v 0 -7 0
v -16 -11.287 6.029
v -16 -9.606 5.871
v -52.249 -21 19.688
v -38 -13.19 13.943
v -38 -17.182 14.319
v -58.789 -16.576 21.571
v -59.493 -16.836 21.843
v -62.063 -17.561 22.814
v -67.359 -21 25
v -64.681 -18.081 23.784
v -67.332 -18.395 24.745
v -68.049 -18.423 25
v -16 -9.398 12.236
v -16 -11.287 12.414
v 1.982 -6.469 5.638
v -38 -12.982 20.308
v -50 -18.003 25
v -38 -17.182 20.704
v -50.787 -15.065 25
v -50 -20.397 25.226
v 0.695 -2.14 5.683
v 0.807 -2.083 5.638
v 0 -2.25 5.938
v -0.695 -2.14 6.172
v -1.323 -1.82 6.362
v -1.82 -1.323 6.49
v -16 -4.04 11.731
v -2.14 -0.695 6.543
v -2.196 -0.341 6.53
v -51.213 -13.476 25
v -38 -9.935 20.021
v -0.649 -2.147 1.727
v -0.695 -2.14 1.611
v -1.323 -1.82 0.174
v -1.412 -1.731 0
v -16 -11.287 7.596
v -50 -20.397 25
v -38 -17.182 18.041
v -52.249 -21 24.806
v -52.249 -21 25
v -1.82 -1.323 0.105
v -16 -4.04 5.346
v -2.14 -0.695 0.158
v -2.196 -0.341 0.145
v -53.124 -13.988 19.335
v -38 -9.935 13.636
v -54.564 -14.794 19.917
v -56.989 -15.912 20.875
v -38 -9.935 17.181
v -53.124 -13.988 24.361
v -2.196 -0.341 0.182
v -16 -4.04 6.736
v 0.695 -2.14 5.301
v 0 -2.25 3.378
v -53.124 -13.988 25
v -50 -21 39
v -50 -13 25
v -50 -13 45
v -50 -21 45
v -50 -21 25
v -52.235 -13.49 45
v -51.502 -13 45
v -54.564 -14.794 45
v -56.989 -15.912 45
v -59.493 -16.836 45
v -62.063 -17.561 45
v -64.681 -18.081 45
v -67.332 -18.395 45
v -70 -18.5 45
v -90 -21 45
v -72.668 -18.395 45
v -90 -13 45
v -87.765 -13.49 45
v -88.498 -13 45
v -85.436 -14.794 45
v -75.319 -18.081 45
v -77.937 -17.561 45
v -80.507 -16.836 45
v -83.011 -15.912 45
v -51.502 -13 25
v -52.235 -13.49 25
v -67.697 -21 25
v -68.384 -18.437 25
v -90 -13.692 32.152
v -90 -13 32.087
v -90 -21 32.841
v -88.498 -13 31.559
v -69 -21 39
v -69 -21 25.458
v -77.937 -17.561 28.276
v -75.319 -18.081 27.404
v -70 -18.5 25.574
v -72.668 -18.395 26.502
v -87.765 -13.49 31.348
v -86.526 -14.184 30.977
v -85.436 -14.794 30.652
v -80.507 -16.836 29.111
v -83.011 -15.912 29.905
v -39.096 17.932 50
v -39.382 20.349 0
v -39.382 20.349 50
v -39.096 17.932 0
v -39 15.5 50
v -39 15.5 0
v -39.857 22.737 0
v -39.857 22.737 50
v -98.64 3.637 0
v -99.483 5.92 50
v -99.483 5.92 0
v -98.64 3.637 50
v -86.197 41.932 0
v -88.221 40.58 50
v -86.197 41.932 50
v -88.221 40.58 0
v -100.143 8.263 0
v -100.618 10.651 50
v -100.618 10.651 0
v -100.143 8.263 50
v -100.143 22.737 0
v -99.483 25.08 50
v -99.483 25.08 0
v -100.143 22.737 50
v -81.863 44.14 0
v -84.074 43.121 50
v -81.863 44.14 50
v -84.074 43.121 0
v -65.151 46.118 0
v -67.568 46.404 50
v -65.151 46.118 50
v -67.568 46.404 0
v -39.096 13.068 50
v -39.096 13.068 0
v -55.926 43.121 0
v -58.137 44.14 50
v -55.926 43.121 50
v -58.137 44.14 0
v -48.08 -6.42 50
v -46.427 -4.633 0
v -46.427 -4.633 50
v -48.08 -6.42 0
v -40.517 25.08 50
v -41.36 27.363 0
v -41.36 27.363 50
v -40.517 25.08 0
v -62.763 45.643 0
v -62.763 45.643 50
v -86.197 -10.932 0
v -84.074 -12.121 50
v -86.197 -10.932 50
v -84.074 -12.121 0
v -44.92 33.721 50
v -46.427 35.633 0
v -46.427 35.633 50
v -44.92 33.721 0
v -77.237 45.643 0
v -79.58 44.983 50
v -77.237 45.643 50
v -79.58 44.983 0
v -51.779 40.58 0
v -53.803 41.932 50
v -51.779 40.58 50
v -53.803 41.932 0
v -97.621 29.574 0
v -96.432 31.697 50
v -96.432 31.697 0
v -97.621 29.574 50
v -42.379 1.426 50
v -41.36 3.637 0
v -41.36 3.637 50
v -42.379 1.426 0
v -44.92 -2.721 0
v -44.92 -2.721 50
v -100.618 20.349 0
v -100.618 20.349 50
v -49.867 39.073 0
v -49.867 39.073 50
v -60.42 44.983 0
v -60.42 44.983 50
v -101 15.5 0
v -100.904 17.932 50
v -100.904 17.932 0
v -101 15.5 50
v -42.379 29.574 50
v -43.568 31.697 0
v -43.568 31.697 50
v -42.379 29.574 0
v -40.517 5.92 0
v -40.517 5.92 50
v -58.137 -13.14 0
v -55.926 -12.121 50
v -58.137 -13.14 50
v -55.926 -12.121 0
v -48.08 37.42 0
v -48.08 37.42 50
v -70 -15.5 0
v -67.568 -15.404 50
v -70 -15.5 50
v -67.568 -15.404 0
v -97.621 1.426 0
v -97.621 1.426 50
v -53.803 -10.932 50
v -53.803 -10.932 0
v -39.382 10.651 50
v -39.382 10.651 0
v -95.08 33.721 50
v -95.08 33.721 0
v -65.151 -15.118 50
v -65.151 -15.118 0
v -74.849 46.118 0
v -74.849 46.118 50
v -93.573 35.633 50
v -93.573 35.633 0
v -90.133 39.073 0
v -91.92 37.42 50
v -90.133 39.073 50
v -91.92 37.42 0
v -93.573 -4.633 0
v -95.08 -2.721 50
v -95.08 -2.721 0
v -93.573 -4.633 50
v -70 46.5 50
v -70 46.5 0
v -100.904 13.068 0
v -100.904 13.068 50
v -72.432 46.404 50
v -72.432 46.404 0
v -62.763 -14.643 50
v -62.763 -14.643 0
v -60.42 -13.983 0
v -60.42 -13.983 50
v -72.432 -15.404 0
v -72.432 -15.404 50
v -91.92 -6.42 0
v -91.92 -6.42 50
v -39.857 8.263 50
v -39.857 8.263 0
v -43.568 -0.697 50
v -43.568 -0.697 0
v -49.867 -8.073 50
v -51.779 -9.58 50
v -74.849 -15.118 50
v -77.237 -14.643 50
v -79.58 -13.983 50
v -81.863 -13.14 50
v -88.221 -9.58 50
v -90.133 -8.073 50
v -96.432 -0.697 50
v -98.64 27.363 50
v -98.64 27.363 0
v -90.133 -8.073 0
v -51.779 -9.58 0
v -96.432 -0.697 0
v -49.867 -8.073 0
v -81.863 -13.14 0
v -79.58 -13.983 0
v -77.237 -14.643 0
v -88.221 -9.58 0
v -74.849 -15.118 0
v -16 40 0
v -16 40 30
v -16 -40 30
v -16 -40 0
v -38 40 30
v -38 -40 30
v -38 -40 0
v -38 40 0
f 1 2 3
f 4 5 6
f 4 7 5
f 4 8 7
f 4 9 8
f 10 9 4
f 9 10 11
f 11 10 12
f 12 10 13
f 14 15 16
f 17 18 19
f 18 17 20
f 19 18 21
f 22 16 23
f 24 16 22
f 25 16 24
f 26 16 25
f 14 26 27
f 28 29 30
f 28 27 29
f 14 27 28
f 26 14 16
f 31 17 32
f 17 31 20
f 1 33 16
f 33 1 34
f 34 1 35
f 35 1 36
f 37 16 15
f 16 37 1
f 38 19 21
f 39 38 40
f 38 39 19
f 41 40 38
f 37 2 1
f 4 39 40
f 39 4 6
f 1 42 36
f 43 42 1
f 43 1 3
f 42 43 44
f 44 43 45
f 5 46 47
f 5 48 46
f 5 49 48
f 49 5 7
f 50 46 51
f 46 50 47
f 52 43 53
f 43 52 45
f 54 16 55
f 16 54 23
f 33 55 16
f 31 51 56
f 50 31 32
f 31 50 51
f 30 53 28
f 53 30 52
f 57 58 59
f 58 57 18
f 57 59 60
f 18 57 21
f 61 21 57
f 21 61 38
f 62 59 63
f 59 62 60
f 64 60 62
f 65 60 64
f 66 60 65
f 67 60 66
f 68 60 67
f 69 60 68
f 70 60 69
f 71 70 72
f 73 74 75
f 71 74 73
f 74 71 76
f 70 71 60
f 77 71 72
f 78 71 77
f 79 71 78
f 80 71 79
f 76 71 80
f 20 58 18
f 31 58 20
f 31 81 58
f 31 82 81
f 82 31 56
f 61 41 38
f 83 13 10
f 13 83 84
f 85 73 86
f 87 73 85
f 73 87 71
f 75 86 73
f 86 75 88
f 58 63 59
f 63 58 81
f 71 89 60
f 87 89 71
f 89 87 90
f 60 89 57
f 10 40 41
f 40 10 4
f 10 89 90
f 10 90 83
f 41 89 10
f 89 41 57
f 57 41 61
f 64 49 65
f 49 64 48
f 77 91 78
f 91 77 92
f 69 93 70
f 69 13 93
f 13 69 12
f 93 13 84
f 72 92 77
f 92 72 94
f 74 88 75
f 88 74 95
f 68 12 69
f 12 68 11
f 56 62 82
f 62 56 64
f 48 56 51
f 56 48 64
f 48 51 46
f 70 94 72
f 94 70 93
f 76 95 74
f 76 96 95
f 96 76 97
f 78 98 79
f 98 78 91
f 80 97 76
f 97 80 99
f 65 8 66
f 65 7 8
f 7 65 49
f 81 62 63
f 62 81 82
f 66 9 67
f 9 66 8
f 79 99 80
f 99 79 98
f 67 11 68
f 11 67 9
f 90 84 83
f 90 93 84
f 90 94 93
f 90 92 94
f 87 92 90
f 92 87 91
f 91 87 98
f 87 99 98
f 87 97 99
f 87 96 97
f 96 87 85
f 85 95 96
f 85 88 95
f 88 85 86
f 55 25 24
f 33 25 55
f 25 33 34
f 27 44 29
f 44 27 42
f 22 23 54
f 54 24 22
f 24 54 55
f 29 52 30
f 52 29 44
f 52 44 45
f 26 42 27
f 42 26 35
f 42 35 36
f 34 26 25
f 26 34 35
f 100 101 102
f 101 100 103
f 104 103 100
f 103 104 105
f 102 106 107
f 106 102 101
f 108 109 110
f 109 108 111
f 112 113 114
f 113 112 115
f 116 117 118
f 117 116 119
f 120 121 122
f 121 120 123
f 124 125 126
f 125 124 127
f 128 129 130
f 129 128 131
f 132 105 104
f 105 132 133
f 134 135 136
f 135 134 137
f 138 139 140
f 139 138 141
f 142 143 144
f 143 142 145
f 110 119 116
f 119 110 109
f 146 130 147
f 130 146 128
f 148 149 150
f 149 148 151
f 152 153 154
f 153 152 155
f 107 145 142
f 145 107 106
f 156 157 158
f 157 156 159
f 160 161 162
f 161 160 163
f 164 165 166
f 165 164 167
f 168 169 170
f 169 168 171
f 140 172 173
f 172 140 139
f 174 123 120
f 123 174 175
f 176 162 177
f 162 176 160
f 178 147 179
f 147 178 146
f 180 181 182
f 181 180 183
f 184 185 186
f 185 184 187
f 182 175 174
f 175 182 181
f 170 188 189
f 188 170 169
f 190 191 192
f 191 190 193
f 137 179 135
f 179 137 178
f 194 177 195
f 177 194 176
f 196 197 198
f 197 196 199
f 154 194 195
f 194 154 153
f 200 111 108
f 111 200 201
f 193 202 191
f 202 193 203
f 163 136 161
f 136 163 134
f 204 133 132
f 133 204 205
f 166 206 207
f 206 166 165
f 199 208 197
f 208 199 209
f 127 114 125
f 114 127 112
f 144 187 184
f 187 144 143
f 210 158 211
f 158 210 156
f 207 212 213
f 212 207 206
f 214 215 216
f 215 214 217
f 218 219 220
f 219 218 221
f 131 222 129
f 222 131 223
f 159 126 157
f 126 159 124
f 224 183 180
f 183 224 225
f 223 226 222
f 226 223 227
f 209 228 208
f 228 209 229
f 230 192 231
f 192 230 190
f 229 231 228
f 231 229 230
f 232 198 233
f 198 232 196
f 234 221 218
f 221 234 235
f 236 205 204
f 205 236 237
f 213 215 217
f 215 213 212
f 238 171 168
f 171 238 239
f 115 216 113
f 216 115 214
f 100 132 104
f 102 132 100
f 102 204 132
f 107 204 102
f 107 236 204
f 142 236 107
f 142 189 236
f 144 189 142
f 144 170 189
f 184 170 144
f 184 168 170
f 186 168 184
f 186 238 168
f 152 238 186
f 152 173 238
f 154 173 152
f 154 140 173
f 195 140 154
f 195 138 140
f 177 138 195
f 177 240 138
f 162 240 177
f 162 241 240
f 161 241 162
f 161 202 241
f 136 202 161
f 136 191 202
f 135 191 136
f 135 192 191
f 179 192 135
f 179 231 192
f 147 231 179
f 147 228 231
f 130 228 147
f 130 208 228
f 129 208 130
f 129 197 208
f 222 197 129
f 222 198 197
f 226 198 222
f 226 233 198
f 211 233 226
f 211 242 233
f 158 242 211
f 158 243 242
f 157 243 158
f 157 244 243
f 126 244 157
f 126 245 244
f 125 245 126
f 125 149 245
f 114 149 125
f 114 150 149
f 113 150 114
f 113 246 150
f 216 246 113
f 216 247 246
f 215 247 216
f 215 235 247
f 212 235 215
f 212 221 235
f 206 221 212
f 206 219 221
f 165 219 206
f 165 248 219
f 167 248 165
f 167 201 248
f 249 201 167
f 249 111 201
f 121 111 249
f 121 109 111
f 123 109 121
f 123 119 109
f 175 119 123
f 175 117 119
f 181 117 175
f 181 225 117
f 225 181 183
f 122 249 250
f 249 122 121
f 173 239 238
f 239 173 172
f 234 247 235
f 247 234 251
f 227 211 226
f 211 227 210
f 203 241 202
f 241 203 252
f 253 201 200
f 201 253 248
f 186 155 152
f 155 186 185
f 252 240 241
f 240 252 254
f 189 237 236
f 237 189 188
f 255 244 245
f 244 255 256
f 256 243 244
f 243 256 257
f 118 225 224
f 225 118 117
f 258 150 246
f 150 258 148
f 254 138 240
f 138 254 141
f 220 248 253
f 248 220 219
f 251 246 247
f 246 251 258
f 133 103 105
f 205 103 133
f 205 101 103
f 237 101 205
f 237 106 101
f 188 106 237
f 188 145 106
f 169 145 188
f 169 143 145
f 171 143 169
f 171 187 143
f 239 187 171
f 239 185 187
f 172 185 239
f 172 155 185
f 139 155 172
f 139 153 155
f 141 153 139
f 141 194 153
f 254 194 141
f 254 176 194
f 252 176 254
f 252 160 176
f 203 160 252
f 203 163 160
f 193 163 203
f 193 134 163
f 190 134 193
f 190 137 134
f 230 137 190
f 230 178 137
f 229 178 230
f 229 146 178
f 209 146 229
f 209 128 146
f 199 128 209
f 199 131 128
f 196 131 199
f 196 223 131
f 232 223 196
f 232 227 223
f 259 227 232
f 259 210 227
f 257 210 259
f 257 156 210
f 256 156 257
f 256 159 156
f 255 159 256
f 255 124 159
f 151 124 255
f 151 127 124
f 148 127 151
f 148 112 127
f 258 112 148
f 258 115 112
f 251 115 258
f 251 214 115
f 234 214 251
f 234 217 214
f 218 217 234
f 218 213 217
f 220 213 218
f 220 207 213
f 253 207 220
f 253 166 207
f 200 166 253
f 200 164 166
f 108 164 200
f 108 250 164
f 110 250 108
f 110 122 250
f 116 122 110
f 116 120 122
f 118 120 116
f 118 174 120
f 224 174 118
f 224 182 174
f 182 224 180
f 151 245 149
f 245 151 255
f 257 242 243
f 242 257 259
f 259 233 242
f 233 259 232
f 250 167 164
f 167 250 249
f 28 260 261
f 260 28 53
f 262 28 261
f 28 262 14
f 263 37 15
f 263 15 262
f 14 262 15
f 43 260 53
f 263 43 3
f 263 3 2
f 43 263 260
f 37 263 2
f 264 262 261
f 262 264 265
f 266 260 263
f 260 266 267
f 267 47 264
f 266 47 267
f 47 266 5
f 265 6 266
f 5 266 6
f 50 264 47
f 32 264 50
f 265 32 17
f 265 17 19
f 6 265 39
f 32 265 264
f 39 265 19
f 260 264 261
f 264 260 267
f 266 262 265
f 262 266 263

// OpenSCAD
module gear (
	mm_per_tooth    = 3,    //this is the "circular pitch", the circumference of the pitch circle divided by the number of teeth
	number_of_teeth = 11,   //total number of teeth around the entire perimeter
	thickness       = 6,    //thickness of gear in mm
	hole_diameter   = 3,    //diameter of the hole in the center, in mm
	twist           = 0,    //teeth rotate this many degrees from bottom of gear to top.  360 makes the gear a screw with each thread going around once
	teeth_to_hide   = 0,    //number of teeth to delete to make this only a fraction of a circle
	pressure_angle  = 28,   //Controls how straight or bulged the tooth sides are. In degrees.
	clearance       = 0.0,  //gap between top of a tooth on one gear and bottom of valley on a meshing gear (in millimeters)
	backlash        = 0.0   //gap between two meshing teeth, in the direction along the circumference of the pitch circle
) {
	assign(pi = 3.1415926)
	assign(p  = mm_per_tooth * number_of_teeth / pi / 2)  //radius of pitch circle
	assign(c  = p + mm_per_tooth / pi - clearance)        //radius of outer circle
	assign(b  = p*cos(pressure_angle))                    //radius of base circle
	assign(r  = p-(c-p)-clearance)                        //radius of root circle
	assign(t  = mm_per_tooth/2-backlash/2)                //tooth thickness at pitch circle
	assign(k  = -iang(b, p) - t/2/p/pi*180) {             //angle to where involute meets base circle on each side of tooth
		difference() {
			for (i = [0:number_of_teeth-teeth_to_hide-1] )
				rotate([0,0,i*360/number_of_teeth])
					linear_extrude(height = thickness, center = true, convexity = 10, twist = twist)
						polygon(
							points=[
								[0, -hole_diameter/10],
								polar(r, -181/number_of_teeth),
								polar(r, r<b ? k : -180/number_of_teeth),
								q7(0/5,r,b,c,k, 1),q7(1/5,r,b,c,k, 1),q7(2/5,r,b,c,k, 1),q7(3/5,r,b,c,k, 1),q7(4/5,r,b,c,k, 1),q7(5/5,r,b,c,k, 1),
								q7(5/5,r,b,c,k,-1),q7(4/5,r,b,c,k,-1),q7(3/5,r,b,c,k,-1),q7(2/5,r,b,c,k,-1),q7(1/5,r,b,c,k,-1),q7(0/5,r,b,c,k,-1),
								polar(r, r<b ? -k : 180/number_of_teeth),
								polar(r, 181/number_of_teeth)
							],
 							paths=[[0,1,2,3,4,5,6,7,8,9,10,11,12,13,14,15,16]]
						);
			cylinder(h=2*thickness+1, r=hole_diameter/2, center=true, $fn=20);
		}
	}
};	
//these 4 functions are used by gear
function polar(r,theta)   = r*[sin(theta), cos(theta)];                            //convert polar to cartesian coordinates
function iang(r1,r2)      = sqrt((r2/r1)*(r2/r1) - 1)/3.1415926*180 - acos(r1/r2); //unwind a string this many degrees to go from radius r1 to radius r2
function q7(f,r,b,r2,t,s) = q6(b,s,t,(1-f)*max(b,r)+f*r2);                         //radius a fraction f up the curved side of the tooth 
function q6(b,s,t,d)      = polar(d,s*(iang(b,d)+t));                              //point at radius d on the involute curve

//a rack, which is a straight line with teeth (the same as a segment from a giant gear with a huge number of teeth).
//The "pitch circle" is a line along the X axis.
module rack (
	mm_per_tooth    = 3,    //this is the "circular pitch", the circumference of the pitch circle divided by the number of teeth
	number_of_teeth = 11,   //total number of teeth along the rack
	thickness       = 6,    //thickness of rack in mm (affects each tooth)
	height          = 120,   //height of rack in mm, from tooth top to far side of rack.
	pressure_angle  = 28,   //Controls how straight or bulged the tooth sides are. In degrees.
	backlash        = 0.0   //gap between two meshing teeth, in the direction along the circumference of the pitch circle
) {
	assign(pi = 3.1415926)
	assign(a = mm_per_tooth / pi) //addendum
	assign(t = a*cos(pressure_angle)-1)         //tooth side is tilted so top/bottom corners move this amount
		for (i = [0:number_of_teeth-1] )
			translate([i*mm_per_tooth,0,0])
				linear_extrude(height = thickness, center = true, convexity = 10)
					polygon(
						points=[
							[-mm_per_tooth * 3/4,                 a-height],
							[-mm_per_tooth * 3/4 - backlash,     -a],
							[-mm_per_tooth * 1/4 + backlash - t, -a],
							[-mm_per_tooth * 1/4 + backlash + t,  a],
							[ mm_per_tooth * 1/4 - backlash - t,  a],
							[ mm_per_tooth * 1/4 - backlash + t, -a],
							[ mm_per_tooth * 3/4 + backlash,     -a],
							[ mm_per_tooth * 3/4,                 a-height],
						],
						paths=[[0,1,2,3,4,5,6,7]]
					);
};


/*
translate([0,0,12.8])rotate([0,45,0])gear(5,19,3,0);
difference(){
    translate([-1,0,0])scale([1/sqrt(2),1,1])cylinder(h=30,r=13.7,$fn=80);
    translate([0,0,11])rotate([0,45,0])
    translate([0,0,20])cube([60,60,40],center=true);
}
*/
module semicircle(r1,r2){
    difference(){
        circle(r=r2,$fn=50);
        translate([-r2,-r2])square([2*r2,r2]);
        circle(r=r1,$fn=50);
    }
}
module arc(r1,r2,x){
    intersection(){
        semicircle(r1,r2);
        rotate(180+x)semicircle(r1,r2);
    }
}

module claw(x=0){
    difference(){
        union(){
            //translate([0,0,4])rotate([0,0,x])gear(4,24,8,0);
            translate([0,-7,0])rotate([0,-70,15])cube([6,7,74]);
            translate([-70-20,-21,25])cube([40,8,20]);
        }
        translate([-70,15.5,0])cylinder(r=34,h=50,$fn=80);
        translate([-69,-21-8,19])cube([40,8,20]);
        translate([-55,-20,9.8])rotate([0,-70,15])cube([10,20,50]);
        cylinder(r=2.25,h=8,$fn=20);
    }
}
module motorHole(x=0.1){
    difference(){
        circle(r=1.45+x,$fn=30);
        translate([0.9+1.5+2*x,0])square([3,3],center=true);
    }
}

translate([-70,15.5,0])cylinder(r=31,h=50,$fn=80);
translate([-38,-40,0])cube([22,80,30]);
claw();
/*translate([0,31,0])mirror([0,1,0])claw(180/24);
translate([0,50.5,0])rotate([0,0,0])difference(){
    translate([0,0,4])gear(4,6,8,0);
    linear_extrude(8)motorHole(0.15);
}*/
